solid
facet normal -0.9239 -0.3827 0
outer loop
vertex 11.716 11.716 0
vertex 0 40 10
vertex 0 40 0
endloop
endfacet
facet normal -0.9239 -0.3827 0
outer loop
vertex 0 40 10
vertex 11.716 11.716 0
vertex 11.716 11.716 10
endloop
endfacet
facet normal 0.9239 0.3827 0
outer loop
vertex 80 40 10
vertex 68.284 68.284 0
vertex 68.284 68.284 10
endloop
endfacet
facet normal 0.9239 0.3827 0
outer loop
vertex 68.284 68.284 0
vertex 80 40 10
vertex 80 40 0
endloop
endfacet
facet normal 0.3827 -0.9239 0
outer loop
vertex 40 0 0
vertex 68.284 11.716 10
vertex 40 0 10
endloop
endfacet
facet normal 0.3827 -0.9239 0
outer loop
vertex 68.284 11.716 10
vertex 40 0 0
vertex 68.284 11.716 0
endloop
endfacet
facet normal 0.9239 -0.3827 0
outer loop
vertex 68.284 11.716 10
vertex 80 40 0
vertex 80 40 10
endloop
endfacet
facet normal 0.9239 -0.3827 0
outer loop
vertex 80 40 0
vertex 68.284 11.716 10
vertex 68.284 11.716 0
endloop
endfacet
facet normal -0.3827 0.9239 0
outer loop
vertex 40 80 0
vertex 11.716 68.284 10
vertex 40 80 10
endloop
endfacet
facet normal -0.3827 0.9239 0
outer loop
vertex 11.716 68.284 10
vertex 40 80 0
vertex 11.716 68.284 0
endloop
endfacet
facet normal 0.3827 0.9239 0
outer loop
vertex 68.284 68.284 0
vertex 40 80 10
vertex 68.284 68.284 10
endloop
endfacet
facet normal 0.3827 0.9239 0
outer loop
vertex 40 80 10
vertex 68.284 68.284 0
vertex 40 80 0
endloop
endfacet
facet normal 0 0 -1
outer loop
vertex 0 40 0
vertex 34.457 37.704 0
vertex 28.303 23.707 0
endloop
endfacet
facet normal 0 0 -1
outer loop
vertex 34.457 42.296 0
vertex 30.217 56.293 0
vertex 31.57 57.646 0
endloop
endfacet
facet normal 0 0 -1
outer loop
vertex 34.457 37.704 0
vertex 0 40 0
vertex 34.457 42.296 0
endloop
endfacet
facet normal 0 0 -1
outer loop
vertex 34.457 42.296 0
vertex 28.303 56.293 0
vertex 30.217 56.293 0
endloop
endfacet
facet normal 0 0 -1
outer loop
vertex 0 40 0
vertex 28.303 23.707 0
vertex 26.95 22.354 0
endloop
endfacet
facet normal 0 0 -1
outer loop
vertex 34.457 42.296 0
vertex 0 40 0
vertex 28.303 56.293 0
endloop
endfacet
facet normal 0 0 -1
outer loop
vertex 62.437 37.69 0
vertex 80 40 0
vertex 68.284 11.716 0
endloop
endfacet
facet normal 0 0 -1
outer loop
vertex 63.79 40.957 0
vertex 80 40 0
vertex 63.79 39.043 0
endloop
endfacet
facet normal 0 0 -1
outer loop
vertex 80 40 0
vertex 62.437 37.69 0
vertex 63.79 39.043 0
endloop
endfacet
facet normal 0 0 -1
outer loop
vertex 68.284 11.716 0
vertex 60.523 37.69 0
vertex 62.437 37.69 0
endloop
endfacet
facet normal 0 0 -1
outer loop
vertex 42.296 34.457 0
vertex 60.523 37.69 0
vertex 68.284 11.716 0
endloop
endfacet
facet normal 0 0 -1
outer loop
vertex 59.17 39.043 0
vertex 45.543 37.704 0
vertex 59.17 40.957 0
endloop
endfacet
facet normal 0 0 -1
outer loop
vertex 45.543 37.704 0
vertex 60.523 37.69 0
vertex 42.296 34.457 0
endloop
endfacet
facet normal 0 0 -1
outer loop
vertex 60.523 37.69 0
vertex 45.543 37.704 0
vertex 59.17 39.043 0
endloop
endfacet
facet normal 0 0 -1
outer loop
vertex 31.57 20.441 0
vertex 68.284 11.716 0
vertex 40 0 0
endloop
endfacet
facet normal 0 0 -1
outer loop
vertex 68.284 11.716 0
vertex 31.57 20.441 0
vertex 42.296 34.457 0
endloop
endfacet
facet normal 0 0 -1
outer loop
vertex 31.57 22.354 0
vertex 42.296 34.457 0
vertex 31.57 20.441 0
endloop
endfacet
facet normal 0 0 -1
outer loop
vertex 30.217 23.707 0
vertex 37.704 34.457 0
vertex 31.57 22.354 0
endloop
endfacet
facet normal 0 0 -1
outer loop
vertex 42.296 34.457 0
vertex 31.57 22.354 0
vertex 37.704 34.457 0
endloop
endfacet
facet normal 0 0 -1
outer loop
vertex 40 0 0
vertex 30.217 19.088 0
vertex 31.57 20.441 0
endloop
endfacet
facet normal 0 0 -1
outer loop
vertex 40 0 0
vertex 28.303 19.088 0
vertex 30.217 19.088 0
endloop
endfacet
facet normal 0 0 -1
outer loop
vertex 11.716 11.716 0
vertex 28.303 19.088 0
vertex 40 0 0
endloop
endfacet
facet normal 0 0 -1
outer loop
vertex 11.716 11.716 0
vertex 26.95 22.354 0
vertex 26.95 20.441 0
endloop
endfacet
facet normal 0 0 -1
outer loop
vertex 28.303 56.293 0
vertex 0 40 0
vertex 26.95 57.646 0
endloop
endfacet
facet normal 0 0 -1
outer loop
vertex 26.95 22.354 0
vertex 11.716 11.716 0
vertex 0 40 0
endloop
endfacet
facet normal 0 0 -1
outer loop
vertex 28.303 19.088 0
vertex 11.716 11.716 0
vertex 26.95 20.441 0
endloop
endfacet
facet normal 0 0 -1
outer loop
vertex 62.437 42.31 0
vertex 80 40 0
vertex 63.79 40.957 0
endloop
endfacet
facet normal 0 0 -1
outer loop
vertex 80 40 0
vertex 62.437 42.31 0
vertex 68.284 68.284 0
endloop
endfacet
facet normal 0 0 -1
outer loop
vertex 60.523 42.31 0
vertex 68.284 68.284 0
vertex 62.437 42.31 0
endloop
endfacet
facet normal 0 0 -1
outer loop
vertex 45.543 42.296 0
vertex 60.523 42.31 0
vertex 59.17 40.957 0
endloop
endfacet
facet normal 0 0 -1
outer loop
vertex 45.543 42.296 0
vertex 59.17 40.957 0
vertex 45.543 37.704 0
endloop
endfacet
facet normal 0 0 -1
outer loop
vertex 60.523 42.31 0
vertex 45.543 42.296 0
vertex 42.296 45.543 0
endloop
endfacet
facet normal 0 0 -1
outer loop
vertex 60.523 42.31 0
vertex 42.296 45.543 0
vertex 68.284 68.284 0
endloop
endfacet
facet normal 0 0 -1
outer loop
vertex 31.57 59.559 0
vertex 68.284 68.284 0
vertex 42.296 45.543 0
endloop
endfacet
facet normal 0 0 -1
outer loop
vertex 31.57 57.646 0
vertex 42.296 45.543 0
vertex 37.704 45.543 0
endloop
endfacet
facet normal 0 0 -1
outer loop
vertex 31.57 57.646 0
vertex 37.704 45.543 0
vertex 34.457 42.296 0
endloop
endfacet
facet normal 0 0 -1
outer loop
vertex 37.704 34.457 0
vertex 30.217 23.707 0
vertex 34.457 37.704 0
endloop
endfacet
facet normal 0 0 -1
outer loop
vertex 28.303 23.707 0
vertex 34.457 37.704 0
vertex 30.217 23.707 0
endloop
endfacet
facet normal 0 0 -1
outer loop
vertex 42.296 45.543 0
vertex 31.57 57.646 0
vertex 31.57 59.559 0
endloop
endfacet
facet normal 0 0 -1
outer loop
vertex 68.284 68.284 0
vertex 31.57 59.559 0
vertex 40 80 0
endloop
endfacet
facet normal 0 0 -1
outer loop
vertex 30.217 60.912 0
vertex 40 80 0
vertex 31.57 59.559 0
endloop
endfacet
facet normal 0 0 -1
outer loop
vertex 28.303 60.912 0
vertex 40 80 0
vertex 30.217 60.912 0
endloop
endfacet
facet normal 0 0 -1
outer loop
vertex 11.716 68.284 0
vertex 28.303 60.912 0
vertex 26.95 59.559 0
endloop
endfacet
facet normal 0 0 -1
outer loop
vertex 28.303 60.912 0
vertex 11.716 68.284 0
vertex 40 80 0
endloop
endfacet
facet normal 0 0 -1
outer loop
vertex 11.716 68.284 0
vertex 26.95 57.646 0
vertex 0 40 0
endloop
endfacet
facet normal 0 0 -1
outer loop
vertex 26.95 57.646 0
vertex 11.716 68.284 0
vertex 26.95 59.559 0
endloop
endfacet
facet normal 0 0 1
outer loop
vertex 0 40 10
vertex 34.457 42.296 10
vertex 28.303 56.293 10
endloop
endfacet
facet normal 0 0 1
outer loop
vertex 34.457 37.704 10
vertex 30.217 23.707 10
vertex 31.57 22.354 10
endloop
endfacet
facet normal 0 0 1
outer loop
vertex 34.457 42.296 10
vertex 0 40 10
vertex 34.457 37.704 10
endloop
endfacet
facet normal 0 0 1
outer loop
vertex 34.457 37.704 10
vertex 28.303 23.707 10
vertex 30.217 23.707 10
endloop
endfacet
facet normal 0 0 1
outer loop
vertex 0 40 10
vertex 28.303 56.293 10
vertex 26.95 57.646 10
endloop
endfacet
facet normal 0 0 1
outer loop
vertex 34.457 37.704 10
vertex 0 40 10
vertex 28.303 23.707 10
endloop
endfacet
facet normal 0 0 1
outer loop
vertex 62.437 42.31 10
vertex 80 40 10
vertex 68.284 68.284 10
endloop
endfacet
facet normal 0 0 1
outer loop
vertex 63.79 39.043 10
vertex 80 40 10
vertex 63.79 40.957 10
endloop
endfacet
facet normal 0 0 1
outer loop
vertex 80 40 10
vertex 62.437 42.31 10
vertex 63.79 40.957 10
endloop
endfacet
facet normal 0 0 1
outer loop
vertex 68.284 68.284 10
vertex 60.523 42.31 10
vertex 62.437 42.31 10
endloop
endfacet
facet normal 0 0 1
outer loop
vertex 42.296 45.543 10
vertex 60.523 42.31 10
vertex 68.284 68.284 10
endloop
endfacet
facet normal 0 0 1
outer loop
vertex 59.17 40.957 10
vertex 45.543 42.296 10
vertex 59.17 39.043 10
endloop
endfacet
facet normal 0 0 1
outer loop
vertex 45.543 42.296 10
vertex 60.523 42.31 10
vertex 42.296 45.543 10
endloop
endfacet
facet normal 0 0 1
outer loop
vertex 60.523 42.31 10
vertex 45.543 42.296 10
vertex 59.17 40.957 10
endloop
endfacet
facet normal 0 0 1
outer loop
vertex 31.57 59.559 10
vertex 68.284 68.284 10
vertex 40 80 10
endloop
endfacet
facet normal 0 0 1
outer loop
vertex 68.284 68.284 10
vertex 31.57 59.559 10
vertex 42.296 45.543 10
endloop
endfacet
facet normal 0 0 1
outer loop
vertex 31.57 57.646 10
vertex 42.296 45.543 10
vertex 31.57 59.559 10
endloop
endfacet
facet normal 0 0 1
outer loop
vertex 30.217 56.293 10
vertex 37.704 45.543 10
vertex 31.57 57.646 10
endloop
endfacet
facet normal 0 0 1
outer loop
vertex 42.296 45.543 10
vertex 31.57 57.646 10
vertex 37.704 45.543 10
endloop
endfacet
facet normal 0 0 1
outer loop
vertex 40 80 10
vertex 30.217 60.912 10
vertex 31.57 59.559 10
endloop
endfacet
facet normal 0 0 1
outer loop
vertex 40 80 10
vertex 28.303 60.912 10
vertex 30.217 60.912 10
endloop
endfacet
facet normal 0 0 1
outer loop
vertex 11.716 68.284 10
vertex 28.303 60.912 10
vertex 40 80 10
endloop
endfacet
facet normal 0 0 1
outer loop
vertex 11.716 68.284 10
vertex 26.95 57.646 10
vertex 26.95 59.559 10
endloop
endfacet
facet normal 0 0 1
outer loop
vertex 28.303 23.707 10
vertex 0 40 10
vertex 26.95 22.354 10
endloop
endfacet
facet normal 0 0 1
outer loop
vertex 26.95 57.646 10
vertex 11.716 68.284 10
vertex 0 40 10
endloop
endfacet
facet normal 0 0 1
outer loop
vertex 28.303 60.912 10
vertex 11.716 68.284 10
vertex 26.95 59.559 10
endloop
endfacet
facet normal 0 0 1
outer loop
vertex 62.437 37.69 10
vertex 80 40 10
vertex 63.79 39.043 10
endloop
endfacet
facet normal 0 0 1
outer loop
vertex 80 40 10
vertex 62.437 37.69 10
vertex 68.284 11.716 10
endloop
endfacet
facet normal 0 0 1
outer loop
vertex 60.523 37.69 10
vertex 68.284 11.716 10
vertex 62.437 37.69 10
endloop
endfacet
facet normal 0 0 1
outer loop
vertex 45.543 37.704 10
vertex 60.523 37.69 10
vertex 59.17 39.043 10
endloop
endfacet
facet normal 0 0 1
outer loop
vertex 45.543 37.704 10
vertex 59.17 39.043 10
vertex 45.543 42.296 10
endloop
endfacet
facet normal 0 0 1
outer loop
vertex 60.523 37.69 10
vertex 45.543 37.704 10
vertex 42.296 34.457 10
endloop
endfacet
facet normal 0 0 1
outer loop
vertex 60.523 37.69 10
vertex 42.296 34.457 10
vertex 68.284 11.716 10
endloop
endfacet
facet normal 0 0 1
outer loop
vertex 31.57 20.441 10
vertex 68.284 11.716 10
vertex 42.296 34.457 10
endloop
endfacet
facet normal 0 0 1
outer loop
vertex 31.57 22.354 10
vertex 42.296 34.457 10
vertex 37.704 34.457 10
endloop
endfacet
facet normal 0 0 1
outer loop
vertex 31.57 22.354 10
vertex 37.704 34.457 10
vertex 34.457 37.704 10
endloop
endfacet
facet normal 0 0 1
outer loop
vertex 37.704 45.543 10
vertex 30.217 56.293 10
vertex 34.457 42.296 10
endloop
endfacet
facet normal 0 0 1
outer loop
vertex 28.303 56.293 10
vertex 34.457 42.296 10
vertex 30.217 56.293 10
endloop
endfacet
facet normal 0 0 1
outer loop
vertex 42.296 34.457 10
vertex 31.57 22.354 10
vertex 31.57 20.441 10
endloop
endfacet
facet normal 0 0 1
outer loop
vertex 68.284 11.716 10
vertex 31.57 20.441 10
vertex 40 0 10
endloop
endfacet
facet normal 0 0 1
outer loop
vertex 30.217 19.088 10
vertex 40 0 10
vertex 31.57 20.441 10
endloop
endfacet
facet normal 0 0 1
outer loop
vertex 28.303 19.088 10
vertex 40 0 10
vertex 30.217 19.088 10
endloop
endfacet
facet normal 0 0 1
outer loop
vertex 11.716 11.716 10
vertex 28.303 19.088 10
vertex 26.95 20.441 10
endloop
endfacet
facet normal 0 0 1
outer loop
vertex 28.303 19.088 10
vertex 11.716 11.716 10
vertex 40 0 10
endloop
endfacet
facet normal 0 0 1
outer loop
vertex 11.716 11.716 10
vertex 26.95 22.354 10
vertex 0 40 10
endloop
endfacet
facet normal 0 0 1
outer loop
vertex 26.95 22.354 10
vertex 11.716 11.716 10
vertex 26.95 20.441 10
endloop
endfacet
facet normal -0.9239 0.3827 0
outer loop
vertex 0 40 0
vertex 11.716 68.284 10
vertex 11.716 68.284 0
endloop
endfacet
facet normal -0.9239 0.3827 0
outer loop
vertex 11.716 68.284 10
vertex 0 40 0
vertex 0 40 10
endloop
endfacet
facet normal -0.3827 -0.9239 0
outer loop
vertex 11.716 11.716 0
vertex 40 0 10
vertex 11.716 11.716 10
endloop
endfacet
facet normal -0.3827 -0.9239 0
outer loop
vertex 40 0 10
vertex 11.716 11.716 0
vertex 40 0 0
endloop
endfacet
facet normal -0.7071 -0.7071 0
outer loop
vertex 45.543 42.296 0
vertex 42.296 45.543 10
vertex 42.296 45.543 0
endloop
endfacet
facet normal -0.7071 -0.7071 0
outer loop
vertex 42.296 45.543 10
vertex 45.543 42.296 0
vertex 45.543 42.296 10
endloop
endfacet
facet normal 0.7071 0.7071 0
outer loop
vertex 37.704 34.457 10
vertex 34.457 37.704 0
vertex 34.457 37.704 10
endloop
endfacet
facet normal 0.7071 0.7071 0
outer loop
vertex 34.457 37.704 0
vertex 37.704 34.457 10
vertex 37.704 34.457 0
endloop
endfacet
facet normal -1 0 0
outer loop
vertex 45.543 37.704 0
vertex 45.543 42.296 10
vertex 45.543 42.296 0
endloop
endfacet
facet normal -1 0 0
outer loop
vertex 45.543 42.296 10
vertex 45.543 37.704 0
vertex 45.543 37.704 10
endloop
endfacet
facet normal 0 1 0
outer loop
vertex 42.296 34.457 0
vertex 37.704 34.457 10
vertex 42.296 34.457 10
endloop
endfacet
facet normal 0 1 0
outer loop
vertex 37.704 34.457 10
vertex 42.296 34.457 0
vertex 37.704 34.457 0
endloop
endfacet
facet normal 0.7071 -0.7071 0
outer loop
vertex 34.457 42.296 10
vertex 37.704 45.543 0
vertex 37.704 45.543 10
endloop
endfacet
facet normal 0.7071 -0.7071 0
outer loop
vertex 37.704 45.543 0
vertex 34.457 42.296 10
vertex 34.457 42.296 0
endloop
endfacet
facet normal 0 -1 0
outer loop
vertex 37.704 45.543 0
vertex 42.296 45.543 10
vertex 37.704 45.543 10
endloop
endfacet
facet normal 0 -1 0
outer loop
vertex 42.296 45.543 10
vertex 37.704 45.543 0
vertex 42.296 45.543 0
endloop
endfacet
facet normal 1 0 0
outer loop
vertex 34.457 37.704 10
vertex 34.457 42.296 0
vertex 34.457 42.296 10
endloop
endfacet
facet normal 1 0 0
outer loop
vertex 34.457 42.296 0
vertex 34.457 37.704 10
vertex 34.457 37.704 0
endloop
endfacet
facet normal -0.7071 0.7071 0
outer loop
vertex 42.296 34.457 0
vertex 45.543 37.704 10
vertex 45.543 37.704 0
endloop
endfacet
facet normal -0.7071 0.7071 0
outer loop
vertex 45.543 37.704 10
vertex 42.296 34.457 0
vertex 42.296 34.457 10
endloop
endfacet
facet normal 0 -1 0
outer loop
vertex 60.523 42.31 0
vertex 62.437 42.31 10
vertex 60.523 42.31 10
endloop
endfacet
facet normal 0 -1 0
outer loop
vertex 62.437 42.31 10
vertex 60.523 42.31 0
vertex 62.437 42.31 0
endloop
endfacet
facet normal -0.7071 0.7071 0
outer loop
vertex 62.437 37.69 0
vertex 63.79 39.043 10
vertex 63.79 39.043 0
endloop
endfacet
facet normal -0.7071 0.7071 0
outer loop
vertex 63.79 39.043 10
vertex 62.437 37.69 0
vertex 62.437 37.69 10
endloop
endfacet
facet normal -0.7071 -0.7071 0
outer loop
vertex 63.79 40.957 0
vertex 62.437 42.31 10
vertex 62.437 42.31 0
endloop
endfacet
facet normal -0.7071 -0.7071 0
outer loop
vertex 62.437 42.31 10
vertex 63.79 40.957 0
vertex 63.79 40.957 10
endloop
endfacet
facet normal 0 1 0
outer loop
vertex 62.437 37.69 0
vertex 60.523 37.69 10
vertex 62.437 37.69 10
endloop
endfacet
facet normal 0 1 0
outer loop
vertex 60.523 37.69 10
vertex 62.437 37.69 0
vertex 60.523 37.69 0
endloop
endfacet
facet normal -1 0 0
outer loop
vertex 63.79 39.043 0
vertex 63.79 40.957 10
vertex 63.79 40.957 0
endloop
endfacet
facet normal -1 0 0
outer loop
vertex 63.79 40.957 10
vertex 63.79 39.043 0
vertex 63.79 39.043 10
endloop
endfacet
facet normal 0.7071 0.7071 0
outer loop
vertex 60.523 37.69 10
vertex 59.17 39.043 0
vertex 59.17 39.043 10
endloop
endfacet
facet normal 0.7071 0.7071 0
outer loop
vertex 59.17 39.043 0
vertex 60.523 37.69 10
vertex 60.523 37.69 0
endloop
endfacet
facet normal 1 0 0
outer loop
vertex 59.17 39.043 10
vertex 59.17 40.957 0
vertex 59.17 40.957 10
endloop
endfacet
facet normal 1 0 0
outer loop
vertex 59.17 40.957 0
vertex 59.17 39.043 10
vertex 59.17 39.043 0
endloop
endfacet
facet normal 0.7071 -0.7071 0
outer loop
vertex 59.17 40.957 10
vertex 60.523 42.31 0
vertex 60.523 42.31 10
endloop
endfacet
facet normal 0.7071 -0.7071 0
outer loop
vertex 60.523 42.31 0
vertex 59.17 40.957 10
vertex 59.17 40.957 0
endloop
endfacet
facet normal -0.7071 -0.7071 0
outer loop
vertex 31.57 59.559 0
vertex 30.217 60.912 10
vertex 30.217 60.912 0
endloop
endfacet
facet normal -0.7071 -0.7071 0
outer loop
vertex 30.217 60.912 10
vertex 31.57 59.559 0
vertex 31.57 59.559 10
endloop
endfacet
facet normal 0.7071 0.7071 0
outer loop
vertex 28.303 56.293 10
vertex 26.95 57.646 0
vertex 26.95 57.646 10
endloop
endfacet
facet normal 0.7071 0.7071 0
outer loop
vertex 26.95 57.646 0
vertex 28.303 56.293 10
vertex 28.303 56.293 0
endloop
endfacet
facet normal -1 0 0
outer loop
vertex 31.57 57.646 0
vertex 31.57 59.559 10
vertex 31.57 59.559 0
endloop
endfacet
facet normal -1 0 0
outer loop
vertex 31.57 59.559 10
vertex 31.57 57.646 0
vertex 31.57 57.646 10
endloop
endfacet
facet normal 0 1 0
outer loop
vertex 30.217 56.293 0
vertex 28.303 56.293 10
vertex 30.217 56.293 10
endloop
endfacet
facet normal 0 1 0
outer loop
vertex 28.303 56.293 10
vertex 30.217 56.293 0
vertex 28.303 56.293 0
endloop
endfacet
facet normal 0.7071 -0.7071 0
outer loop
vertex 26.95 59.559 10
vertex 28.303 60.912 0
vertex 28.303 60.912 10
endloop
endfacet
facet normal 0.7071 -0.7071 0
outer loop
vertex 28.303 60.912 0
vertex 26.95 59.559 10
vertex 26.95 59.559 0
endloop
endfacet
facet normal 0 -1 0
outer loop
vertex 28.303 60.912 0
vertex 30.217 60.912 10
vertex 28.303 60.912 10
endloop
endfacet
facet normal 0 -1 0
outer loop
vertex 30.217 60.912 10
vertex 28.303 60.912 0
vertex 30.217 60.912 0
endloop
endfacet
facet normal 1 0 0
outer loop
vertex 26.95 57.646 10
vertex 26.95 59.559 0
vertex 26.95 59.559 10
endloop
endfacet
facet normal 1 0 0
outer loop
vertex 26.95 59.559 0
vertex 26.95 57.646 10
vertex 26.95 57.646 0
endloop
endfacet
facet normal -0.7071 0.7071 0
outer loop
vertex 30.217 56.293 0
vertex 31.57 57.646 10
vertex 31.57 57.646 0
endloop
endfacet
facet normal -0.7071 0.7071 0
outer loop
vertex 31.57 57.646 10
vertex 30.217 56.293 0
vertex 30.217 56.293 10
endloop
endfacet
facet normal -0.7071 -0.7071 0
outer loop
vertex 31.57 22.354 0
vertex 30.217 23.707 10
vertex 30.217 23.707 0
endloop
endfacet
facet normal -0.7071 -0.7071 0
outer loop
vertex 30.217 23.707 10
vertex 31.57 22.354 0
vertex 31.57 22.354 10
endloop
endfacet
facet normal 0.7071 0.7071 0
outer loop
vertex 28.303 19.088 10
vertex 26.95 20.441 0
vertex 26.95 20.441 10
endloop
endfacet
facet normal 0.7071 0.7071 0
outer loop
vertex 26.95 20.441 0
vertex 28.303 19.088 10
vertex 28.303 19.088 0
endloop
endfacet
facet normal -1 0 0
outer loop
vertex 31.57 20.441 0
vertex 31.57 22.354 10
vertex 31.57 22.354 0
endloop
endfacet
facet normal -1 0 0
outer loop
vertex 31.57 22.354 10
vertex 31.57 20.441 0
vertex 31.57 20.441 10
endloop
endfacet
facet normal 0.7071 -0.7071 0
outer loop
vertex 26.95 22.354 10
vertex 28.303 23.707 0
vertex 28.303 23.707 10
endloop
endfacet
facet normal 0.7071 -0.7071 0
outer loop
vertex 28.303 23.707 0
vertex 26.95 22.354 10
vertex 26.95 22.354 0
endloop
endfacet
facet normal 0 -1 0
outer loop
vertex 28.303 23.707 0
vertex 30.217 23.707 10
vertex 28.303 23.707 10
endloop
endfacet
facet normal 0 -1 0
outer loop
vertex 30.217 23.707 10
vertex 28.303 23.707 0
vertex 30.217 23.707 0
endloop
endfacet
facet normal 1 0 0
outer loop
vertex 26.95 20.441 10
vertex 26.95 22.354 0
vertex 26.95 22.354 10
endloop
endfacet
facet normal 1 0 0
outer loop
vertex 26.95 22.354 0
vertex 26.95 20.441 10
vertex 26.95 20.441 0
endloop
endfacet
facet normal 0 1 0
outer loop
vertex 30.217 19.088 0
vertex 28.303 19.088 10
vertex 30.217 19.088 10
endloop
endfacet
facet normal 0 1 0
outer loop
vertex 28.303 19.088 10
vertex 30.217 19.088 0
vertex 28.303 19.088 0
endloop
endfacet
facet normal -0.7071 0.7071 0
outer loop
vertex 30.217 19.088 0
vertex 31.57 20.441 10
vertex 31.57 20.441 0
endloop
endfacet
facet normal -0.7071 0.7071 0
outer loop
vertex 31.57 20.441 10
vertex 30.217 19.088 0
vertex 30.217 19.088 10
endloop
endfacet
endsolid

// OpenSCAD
$fn = 32;

// ----------------------------------------------------------------------
// Polygon plate: 8-gon R40, 3 bolt windows
// ----------------------------------------------------------------------

// --- parameters (mm) ---
sides = 8;                // number of polygon sides
plate_r = 40;             // circumscribed radius of the polygon
bore_r = 6;               // centre bore radius
bolts = 3;                // number of bolt windows
ring_r = 21.48;           // bolt-circle radius
bolt_r = 2.5;             // bolt window radius
plate_t = 10;             // plate thickness, Z (extrusion height)

plate_d = 2 * plate_r;  // circumscribed diameter
bore_d = 2 * bore_r;  // centre bore diameter
bolt_d = 2 * bolt_r;  // bolt window diameter
ring_d = 2 * ring_r;  // bolt-circle diameter

profile = [[80, 40], [68.284, 68.284], [40, 80], [11.716, 68.284], [0, 40], [11.716, 11.716], [40, 0], [68.284, 11.716]];  // primary outline, 8 points, counter clockwise
void_1 = [[45.543, 42.296], [42.296, 45.543], [37.704, 45.543], [34.457, 42.296], [34.457, 37.704], [37.704, 34.457], [42.296, 34.457], [45.543, 37.704]];  // centre bore, 8 points
void_2 = [[63.79, 40.957], [62.437, 42.31], [60.523, 42.31], [59.17, 40.957], [59.17, 39.043], [60.523, 37.69], [62.437, 37.69], [63.79, 39.043]];  // bolt window 1, 8 points
void_3 = [[31.57, 59.559], [30.217, 60.912], [28.303, 60.912], [26.95, 59.559], [26.95, 57.646], [28.303, 56.293], [30.217, 56.293], [31.57, 57.646]];  // bolt window 2, 8 points
void_4 = [[31.57, 22.354], [30.217, 23.707], [28.303, 23.707], [26.95, 22.354], [26.95, 20.441], [28.303, 19.088], [30.217, 19.088], [31.57, 20.441]];  // bolt window 3, 8 points

// --- the one profile operation ---
difference() {
  linear_extrude(height = plate_t) polygon(points = profile);
  translate([0, 0, -1])
    linear_extrude(height = plate_t + 2) polygon(points = void_1);
  translate([0, 0, -1])
    linear_extrude(height = plate_t + 2) polygon(points = void_2);
  translate([0, 0, -1])
    linear_extrude(height = plate_t + 2) polygon(points = void_3);
  translate([0, 0, -1])
    linear_extrude(height = plate_t + 2) polygon(points = void_4);
}
